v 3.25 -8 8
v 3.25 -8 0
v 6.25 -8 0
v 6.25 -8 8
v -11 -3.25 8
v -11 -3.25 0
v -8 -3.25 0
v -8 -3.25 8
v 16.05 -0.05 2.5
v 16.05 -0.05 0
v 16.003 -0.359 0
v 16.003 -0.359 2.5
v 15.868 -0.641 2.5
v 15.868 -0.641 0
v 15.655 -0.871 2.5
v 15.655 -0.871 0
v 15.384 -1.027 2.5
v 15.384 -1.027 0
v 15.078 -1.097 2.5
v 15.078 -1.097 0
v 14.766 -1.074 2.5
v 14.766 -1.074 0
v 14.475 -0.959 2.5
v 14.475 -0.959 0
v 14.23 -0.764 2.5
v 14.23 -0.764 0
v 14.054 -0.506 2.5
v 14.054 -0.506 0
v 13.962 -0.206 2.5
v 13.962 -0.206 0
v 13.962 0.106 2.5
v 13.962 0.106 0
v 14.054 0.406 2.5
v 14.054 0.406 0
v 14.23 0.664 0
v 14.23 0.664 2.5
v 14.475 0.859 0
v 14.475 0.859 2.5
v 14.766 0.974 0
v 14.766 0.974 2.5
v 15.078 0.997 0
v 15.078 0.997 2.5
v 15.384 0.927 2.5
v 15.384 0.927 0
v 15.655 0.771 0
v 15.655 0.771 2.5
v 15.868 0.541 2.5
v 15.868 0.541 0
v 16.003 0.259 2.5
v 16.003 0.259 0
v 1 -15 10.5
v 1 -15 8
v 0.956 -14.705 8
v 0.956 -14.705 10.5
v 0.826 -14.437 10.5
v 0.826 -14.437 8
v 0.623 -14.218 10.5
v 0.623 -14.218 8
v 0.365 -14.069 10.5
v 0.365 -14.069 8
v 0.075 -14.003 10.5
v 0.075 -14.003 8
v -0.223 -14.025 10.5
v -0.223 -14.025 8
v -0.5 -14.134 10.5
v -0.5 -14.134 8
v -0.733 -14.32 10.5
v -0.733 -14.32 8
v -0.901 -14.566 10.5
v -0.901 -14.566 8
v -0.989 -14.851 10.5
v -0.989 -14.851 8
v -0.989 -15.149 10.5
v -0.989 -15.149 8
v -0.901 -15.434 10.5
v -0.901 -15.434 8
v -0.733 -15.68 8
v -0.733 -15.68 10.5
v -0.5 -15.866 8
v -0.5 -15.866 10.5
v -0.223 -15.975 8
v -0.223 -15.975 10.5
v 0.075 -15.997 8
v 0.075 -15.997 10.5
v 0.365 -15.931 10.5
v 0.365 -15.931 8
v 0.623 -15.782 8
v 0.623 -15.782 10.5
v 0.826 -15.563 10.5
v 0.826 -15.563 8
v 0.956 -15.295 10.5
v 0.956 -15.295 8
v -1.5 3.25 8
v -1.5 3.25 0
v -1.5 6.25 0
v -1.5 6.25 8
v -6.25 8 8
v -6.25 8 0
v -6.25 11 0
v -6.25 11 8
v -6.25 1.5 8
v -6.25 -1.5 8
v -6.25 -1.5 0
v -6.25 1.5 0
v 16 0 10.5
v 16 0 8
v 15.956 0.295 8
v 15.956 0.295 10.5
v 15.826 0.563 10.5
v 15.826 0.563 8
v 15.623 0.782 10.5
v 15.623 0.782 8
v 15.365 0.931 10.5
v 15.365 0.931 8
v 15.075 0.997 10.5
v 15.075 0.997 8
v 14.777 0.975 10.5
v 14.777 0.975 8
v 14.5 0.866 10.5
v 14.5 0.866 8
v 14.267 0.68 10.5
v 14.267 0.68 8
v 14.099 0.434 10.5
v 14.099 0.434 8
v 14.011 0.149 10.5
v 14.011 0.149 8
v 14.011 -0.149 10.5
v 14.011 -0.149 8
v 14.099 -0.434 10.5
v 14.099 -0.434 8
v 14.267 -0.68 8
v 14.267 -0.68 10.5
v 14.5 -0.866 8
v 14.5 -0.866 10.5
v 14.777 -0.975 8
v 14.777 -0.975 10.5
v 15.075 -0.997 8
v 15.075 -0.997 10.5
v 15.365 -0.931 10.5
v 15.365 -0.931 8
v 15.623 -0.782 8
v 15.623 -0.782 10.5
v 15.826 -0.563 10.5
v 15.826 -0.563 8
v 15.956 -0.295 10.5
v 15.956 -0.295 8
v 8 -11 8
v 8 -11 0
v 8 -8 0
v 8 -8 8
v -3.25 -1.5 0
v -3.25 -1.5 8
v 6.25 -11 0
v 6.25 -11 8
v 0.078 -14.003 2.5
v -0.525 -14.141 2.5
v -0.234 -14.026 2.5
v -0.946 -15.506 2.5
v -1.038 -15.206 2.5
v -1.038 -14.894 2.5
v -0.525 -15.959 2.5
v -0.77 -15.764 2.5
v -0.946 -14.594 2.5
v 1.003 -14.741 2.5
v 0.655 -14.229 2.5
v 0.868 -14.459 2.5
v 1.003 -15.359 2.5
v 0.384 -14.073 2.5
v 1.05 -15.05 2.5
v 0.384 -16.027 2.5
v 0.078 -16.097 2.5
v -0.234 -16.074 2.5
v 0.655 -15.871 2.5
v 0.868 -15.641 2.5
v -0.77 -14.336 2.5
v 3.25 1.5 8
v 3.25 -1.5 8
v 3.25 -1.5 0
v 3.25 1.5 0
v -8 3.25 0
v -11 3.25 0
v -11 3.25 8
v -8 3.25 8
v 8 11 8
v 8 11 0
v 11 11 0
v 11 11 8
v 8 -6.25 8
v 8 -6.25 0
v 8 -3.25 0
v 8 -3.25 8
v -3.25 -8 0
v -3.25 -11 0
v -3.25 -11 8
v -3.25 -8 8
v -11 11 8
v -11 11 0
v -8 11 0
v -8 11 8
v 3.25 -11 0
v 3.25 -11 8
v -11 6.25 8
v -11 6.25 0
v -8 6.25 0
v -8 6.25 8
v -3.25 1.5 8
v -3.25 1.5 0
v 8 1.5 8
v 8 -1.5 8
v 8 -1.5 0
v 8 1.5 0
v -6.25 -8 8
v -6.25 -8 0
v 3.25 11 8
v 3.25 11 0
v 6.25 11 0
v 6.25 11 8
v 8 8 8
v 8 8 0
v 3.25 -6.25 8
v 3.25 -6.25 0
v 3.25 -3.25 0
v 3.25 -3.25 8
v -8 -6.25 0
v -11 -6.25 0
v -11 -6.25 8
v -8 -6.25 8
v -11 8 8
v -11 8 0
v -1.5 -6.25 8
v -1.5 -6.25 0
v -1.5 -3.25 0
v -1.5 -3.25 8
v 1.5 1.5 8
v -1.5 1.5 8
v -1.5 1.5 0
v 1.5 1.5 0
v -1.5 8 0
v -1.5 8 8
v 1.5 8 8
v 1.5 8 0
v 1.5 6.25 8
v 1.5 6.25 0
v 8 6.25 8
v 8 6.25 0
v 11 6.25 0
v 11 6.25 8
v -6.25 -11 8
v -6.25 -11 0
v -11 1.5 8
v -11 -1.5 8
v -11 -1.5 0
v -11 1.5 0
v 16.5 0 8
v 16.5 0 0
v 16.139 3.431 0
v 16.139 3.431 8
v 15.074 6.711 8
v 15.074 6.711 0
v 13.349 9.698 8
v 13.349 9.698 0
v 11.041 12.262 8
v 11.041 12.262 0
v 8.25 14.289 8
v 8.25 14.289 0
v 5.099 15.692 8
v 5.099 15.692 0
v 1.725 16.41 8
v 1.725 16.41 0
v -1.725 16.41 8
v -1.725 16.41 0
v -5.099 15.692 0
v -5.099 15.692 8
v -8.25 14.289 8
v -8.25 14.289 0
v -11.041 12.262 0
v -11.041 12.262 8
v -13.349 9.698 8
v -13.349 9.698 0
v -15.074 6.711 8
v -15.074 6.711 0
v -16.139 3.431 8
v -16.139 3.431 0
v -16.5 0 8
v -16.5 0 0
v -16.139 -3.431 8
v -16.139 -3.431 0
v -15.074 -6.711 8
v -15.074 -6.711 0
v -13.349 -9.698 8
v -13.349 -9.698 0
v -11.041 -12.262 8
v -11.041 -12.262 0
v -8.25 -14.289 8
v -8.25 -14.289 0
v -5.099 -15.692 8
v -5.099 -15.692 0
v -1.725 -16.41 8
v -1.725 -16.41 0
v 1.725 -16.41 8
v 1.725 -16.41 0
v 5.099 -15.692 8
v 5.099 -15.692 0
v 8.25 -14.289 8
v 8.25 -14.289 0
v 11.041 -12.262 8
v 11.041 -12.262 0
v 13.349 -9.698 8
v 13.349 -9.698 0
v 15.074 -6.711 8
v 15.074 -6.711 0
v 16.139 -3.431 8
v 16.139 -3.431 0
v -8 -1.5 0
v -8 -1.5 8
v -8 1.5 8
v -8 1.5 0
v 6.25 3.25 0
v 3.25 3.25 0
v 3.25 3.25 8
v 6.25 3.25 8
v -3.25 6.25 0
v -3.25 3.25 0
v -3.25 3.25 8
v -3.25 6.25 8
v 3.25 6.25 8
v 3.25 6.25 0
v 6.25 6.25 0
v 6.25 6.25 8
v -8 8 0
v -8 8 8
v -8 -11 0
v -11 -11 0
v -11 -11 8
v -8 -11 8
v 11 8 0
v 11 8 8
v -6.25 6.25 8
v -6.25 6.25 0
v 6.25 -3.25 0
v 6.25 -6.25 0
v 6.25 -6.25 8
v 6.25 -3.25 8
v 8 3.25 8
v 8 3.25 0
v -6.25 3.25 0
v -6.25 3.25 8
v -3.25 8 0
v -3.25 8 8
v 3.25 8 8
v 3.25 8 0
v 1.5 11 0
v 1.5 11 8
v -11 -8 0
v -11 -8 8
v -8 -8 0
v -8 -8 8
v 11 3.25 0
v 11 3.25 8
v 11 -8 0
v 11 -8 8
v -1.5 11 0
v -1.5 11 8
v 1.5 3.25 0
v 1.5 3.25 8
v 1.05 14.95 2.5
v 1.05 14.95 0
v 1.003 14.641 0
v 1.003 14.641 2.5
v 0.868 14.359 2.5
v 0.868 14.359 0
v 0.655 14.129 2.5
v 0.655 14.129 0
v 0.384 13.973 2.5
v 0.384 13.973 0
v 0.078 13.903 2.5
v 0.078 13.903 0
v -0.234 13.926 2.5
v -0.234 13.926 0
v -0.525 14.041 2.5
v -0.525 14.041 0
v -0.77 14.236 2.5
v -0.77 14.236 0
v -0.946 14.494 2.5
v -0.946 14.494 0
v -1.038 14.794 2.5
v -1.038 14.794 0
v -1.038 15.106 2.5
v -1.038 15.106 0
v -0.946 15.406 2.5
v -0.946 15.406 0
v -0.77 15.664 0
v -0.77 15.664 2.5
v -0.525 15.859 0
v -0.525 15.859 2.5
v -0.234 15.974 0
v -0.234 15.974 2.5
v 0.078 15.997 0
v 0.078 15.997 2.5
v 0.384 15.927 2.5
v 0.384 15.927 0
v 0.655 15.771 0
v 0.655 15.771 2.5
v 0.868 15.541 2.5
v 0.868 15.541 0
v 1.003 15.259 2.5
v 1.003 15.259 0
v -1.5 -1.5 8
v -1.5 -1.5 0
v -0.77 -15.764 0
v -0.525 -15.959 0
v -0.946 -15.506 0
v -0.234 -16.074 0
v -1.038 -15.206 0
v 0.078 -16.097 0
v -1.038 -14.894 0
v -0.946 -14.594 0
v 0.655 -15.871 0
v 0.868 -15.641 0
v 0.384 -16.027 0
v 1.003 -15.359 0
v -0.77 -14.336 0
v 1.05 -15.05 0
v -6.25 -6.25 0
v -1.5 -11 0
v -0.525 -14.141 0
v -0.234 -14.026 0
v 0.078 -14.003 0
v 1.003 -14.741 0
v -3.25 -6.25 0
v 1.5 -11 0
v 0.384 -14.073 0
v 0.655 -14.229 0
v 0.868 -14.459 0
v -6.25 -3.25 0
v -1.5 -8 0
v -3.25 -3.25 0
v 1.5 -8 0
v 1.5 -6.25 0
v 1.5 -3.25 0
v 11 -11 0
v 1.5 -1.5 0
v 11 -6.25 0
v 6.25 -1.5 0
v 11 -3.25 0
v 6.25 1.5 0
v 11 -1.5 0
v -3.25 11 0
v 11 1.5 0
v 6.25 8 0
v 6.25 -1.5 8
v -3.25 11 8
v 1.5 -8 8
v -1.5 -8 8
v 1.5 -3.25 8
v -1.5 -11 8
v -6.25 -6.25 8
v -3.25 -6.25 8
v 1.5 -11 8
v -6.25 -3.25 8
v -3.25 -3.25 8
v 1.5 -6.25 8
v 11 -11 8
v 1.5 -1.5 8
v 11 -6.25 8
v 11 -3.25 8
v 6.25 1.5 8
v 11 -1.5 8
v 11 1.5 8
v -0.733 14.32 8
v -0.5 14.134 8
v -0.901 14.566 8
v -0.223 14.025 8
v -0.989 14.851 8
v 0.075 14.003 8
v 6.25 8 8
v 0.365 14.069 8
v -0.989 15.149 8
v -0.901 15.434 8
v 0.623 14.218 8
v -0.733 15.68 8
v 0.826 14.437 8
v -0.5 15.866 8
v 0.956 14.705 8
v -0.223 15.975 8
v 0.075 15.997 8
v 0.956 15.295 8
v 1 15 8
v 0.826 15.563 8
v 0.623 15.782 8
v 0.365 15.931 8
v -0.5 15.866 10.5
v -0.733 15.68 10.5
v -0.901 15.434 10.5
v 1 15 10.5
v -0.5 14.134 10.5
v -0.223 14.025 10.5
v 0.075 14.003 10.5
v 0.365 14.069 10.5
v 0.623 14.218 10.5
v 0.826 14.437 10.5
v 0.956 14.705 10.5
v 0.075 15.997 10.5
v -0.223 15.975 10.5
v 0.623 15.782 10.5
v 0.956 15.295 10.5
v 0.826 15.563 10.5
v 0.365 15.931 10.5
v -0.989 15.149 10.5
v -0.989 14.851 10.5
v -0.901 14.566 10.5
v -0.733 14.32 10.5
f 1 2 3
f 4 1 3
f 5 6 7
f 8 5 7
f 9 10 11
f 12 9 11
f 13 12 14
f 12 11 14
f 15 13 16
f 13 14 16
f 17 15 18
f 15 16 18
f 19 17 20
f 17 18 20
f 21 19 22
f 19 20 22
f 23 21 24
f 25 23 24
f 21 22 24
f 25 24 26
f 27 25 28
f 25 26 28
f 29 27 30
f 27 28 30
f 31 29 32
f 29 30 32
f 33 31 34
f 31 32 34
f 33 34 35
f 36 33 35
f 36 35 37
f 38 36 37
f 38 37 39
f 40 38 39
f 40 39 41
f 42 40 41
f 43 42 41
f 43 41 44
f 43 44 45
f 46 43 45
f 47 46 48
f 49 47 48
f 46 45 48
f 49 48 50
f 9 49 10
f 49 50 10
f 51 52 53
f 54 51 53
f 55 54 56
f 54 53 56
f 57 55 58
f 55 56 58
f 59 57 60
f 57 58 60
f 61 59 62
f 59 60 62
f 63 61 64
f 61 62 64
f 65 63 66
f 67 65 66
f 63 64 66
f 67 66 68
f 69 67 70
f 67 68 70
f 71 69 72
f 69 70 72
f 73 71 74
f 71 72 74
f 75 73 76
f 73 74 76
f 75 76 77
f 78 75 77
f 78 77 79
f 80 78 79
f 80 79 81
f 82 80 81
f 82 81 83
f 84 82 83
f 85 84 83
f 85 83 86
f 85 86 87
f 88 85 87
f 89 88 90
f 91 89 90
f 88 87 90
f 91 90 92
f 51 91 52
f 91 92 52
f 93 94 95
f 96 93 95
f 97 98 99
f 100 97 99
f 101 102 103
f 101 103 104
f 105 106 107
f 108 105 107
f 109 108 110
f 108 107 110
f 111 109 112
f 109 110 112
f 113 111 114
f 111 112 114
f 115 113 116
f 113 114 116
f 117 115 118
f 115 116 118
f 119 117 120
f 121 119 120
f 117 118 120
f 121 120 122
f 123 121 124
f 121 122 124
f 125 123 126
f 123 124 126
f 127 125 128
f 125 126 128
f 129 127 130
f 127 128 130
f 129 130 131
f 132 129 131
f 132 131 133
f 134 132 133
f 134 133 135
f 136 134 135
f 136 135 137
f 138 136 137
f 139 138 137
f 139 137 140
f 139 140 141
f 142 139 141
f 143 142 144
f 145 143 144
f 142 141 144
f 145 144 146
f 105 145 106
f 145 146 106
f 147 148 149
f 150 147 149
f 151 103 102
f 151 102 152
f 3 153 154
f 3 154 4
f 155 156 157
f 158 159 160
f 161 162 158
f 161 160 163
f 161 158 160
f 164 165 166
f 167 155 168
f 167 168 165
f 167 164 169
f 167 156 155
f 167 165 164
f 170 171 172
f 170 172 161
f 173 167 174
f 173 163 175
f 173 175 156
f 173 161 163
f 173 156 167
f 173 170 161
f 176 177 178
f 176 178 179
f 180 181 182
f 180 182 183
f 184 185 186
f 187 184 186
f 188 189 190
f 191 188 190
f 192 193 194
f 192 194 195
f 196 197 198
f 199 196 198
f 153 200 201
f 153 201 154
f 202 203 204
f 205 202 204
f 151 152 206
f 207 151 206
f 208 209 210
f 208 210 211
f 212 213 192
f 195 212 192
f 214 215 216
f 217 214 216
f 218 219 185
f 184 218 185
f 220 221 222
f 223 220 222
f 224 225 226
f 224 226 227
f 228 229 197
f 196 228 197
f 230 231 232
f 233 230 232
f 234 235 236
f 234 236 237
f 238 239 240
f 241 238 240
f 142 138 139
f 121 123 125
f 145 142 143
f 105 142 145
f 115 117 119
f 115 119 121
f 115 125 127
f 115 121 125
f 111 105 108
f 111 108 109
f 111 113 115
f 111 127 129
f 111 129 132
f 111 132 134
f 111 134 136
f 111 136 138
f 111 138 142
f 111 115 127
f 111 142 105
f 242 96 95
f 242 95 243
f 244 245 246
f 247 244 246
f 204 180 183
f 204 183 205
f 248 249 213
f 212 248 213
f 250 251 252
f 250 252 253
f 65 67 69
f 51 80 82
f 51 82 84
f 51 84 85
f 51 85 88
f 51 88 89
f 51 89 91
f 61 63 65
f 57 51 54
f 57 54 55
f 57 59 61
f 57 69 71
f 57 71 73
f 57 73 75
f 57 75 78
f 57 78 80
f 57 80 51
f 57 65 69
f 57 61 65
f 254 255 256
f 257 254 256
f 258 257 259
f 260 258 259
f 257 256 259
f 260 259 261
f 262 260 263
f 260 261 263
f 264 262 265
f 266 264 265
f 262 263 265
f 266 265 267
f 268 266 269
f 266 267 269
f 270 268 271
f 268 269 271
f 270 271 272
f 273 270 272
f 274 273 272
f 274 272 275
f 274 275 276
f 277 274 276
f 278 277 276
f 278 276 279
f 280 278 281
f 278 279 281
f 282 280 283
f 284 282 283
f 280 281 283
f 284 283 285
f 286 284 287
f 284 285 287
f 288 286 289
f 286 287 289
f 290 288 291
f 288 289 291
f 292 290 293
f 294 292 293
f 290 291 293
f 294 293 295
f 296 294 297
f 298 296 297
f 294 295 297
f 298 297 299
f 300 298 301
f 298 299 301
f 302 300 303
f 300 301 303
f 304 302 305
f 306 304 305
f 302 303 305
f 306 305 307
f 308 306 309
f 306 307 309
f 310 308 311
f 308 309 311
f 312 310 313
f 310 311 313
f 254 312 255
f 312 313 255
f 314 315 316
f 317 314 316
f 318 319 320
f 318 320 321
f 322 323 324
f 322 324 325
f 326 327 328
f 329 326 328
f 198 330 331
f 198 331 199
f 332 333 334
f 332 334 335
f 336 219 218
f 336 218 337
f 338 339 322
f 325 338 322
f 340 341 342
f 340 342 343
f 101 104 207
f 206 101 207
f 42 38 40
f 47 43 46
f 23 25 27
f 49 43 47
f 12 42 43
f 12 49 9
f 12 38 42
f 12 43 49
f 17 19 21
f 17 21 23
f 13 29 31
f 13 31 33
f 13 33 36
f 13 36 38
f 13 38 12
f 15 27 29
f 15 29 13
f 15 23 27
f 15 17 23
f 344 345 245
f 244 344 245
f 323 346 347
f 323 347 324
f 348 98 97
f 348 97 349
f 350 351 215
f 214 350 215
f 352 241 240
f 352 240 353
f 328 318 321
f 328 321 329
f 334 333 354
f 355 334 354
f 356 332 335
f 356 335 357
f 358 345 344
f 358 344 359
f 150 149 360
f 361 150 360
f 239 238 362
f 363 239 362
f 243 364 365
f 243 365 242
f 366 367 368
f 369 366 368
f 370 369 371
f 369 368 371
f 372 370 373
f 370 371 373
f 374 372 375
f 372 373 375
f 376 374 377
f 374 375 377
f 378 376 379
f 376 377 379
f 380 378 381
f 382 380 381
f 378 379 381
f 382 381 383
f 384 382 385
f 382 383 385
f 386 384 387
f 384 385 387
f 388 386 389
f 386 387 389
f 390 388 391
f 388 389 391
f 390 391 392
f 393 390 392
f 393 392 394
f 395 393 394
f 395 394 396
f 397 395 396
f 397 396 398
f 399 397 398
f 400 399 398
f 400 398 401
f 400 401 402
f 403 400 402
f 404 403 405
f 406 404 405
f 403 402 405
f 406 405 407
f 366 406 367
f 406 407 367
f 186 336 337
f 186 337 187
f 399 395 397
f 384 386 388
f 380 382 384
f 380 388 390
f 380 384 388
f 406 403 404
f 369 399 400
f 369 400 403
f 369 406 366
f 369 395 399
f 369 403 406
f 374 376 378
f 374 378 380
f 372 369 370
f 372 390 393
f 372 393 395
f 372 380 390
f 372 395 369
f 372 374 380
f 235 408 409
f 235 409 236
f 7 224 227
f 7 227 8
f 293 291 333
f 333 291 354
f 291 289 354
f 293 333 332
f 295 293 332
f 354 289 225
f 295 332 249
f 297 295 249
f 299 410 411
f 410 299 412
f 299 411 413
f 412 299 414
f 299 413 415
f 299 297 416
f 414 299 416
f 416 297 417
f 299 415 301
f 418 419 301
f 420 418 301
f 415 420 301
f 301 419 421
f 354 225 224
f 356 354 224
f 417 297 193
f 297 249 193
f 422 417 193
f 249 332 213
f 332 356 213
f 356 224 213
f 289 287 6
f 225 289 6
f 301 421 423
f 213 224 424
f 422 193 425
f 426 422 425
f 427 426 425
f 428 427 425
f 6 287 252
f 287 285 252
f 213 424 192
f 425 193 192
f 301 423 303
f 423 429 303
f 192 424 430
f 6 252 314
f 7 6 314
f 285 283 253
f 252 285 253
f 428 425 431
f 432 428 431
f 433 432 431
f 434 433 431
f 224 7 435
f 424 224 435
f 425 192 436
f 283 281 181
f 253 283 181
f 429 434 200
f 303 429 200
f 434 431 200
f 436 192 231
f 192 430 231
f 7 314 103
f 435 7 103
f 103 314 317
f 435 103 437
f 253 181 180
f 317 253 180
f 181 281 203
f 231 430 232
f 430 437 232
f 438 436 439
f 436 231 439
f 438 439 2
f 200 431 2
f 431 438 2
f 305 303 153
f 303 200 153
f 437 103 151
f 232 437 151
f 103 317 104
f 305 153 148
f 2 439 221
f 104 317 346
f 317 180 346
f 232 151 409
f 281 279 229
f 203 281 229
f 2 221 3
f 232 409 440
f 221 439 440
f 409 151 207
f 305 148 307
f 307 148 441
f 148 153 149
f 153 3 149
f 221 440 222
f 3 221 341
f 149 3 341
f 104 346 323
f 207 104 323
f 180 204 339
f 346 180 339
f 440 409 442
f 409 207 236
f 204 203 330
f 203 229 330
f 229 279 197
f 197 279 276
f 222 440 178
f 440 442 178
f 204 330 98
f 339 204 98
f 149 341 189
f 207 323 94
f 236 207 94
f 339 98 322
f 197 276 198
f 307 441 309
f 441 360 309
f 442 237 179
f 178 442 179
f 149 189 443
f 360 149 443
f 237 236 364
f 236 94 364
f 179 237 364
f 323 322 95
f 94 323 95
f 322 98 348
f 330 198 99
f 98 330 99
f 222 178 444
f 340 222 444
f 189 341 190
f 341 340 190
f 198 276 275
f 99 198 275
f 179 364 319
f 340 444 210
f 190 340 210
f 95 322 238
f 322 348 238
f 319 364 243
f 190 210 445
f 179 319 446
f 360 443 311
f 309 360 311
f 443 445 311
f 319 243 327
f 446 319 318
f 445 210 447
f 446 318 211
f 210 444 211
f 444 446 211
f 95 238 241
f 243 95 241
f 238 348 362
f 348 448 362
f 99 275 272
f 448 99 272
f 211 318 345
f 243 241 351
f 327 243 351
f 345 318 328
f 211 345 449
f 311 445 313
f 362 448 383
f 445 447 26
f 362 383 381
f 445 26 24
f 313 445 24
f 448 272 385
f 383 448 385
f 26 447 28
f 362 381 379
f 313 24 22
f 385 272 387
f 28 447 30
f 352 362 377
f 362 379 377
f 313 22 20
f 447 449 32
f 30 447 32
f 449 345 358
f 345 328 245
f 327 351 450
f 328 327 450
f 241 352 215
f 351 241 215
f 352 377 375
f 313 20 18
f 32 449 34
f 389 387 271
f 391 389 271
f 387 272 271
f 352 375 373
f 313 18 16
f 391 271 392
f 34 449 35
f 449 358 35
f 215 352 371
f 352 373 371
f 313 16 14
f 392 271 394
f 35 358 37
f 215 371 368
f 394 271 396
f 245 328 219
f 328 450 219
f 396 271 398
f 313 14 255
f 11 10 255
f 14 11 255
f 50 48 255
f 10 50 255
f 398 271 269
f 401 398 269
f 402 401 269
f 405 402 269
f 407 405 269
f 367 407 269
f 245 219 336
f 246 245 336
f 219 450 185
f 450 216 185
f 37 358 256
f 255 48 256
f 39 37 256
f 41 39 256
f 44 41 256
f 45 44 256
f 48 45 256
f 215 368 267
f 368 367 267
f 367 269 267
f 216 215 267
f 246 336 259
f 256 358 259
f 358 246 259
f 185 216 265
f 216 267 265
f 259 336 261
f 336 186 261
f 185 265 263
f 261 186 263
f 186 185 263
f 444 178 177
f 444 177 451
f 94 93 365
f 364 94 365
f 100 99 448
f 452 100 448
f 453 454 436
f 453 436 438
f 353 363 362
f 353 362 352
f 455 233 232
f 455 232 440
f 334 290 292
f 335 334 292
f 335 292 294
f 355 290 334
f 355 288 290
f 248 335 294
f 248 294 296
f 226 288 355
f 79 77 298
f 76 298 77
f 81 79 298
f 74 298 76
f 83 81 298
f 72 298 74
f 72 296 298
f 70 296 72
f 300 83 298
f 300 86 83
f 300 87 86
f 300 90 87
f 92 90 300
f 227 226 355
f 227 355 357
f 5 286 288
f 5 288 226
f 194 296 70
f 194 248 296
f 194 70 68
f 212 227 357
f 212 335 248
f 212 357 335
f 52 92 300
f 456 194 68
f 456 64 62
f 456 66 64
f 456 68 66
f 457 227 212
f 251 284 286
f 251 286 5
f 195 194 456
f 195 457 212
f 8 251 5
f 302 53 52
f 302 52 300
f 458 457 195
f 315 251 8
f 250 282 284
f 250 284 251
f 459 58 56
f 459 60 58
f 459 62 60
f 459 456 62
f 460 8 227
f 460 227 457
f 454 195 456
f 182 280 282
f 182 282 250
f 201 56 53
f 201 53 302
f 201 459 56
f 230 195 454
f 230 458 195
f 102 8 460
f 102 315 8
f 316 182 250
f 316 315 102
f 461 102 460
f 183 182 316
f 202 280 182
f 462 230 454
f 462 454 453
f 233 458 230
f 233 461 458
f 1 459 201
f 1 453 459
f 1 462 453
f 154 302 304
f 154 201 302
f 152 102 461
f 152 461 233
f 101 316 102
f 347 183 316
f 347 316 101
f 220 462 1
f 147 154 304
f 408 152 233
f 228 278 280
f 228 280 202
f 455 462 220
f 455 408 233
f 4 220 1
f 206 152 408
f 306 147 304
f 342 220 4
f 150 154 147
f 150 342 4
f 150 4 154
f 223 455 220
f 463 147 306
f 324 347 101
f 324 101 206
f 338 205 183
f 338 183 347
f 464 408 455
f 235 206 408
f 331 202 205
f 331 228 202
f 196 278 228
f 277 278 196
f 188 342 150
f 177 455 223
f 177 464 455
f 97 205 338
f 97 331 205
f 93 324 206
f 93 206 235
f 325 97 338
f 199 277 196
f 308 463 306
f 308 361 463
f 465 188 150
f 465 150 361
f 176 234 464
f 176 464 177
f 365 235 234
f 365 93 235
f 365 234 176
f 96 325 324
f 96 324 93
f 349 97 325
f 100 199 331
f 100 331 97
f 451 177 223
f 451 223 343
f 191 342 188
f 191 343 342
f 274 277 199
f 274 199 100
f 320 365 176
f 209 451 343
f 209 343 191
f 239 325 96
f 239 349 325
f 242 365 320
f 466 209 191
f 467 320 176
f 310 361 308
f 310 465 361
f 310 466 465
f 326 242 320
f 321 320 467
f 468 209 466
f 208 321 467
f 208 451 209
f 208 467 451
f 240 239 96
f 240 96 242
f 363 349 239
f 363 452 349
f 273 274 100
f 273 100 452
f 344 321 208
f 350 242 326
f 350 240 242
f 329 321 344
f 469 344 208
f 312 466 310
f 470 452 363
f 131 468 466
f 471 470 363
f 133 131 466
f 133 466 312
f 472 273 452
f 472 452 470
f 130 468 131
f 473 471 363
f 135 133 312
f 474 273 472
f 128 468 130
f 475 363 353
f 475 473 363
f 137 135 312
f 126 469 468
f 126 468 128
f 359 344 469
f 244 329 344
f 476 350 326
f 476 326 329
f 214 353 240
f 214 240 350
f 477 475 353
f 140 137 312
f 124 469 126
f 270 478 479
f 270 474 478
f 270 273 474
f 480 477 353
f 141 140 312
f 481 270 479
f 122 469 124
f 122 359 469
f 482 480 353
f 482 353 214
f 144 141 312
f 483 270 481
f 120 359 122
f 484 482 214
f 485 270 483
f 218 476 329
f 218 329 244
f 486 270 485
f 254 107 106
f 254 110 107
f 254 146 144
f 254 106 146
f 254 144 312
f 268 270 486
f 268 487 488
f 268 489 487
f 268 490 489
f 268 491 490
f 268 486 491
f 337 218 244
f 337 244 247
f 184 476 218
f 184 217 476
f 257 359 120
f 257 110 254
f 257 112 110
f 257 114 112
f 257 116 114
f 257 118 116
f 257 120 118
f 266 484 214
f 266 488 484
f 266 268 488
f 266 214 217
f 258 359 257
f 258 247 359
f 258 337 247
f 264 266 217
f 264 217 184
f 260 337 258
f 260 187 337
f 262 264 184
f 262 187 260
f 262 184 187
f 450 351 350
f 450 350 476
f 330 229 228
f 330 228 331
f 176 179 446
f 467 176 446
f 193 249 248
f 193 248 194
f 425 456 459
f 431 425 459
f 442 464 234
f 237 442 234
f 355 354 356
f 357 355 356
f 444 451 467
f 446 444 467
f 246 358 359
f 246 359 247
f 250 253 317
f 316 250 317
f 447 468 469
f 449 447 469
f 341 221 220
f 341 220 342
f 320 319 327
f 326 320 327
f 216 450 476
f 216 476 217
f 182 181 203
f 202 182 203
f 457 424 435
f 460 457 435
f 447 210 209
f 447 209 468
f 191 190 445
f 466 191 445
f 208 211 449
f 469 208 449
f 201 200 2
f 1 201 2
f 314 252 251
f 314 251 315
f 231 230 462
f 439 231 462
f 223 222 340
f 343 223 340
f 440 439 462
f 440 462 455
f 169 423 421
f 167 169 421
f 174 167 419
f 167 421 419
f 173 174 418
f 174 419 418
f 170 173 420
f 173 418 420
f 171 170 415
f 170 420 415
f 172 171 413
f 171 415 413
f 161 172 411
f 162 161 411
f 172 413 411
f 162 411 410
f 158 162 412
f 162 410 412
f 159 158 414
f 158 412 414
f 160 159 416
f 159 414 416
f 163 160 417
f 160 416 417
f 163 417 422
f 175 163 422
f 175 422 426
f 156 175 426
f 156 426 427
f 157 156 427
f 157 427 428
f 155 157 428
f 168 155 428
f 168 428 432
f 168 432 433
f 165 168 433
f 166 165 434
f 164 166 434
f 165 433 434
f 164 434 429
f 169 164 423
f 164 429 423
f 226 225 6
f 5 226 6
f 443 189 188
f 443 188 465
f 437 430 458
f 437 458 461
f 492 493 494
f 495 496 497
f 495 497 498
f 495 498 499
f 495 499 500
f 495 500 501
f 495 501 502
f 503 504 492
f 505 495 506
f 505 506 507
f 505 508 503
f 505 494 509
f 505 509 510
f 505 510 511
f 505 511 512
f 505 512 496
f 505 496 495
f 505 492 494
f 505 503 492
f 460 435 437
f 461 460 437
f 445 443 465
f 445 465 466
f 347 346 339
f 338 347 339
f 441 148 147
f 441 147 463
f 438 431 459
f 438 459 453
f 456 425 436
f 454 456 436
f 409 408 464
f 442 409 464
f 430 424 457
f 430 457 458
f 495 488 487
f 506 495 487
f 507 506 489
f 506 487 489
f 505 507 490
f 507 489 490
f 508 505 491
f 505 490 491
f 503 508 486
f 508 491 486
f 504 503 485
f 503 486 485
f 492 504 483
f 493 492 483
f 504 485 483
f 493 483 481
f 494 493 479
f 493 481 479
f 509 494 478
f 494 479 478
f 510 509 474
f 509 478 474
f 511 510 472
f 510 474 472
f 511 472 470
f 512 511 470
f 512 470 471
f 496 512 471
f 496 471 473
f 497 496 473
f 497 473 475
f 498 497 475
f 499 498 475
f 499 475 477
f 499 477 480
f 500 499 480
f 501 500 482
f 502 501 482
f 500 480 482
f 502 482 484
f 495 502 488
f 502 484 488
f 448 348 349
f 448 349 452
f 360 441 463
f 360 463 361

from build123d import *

# Parameters (mm, degrees)
F0_R     = 16.5
F1_DEPTH = 8
F2_R     = 1.05
F3_DEPTH = 2.5
F4_R     = 1
F5_DEPTH = 2.5
F6_W     = 3
F6_H     = 3
F7_DEPTH = 8.001


with BuildPart() as f1:
    # F0 (on Top) → F1 (new body)
    with BuildSketch(Plane.XY):
        Circle(F0_R)
    extrude(amount=F1_DEPTH)

    # F2 (on face) → F3 (cut)
    with BuildSketch(Plane(origin=(0, 0, 0), x_dir=(1, 0, 0), z_dir=(0, 0, -1))):
        with Locations((0, 15.05)):
            Circle(F2_R)
        with Locations((15, 0.05)):
            Circle(F2_R)
        with Locations((0, -14.95)):
            Circle(F2_R)
    extrude(amount=-F3_DEPTH, mode=Mode.SUBTRACT)

    # F4 (on face) → F5 (join)
    with BuildSketch(Plane.XY.offset(8)):
        with Locations((0, 15)):
            Circle(F4_R)
        with Locations((15, 0)):
            Circle(F4_R)
        with Locations((0, -15)):
            Circle(F4_R)
    extrude(amount=F5_DEPTH)

    # F6 (on face) → F7 (cut, through all)
    with BuildSketch(Plane.XY.offset(8)):
        with Locations((-9.5, 9.5)):
            Rectangle(F6_W, F6_H)
        with Locations((-9.5, 4.75)):
            Rectangle(F6_W, F6_H)
        with Locations((-9.5, 0)):
            Rectangle(F6_W, F6_H)
        with Locations((-9.5, -4.75)):
            Rectangle(F6_W, F6_H)
        with Locations((-9.5, -9.5)):
            Rectangle(F6_W, F6_H)
        with Locations((-4.75, 9.5)):
            Rectangle(F6_W, F6_H)
        with Locations((-4.75, 4.75)):
            Rectangle(F6_W, F6_H)
        with Locations((-4.75, 0)):
            Rectangle(F6_W, F6_H)
        with Locations((-4.75, -4.75)):
            Rectangle(F6_W, F6_H)
        with Locations((-4.75, -9.5)):
            Rectangle(F6_W, F6_H)
        with Locations((0, 9.5)):
            Rectangle(F6_W, F6_H)
        with Locations((0, 4.75)):
            Rectangle(F6_W, F6_H)
        Rectangle(F6_W, F6_H)
        with Locations((0, -4.75)):
            Rectangle(F6_W, F6_H)
        with Locations((0, -9.5)):
            Rectangle(F6_W, F6_H)
        with Locations((4.75, 9.5)):
            Rectangle(F6_W, F6_H)
        with Locations((4.75, 4.75)):
            Rectangle(F6_W, F6_H)
        with Locations((4.75, 0)):
            Rectangle(F6_W, F6_H)
        with Locations((4.75, -4.75)):
            Rectangle(F6_W, F6_H)
        with Locations((4.75, -9.5)):
            Rectangle(F6_W, F6_H)
        with Locations((9.5, 9.5)):
            Rectangle(F6_W, F6_H)
        with Locations((9.5, 4.75)):
            Rectangle(F6_W, F6_H)
        with Locations((9.5, 0)):
            Rectangle(F6_W, F6_H)
        with Locations((9.5, -4.75)):
            Rectangle(F6_W, F6_H)
        with Locations((9.5, -9.5)):
            Rectangle(F6_W, F6_H)
    extrude(amount=-F7_DEPTH, mode=Mode.SUBTRACT)


solid = f1.part
